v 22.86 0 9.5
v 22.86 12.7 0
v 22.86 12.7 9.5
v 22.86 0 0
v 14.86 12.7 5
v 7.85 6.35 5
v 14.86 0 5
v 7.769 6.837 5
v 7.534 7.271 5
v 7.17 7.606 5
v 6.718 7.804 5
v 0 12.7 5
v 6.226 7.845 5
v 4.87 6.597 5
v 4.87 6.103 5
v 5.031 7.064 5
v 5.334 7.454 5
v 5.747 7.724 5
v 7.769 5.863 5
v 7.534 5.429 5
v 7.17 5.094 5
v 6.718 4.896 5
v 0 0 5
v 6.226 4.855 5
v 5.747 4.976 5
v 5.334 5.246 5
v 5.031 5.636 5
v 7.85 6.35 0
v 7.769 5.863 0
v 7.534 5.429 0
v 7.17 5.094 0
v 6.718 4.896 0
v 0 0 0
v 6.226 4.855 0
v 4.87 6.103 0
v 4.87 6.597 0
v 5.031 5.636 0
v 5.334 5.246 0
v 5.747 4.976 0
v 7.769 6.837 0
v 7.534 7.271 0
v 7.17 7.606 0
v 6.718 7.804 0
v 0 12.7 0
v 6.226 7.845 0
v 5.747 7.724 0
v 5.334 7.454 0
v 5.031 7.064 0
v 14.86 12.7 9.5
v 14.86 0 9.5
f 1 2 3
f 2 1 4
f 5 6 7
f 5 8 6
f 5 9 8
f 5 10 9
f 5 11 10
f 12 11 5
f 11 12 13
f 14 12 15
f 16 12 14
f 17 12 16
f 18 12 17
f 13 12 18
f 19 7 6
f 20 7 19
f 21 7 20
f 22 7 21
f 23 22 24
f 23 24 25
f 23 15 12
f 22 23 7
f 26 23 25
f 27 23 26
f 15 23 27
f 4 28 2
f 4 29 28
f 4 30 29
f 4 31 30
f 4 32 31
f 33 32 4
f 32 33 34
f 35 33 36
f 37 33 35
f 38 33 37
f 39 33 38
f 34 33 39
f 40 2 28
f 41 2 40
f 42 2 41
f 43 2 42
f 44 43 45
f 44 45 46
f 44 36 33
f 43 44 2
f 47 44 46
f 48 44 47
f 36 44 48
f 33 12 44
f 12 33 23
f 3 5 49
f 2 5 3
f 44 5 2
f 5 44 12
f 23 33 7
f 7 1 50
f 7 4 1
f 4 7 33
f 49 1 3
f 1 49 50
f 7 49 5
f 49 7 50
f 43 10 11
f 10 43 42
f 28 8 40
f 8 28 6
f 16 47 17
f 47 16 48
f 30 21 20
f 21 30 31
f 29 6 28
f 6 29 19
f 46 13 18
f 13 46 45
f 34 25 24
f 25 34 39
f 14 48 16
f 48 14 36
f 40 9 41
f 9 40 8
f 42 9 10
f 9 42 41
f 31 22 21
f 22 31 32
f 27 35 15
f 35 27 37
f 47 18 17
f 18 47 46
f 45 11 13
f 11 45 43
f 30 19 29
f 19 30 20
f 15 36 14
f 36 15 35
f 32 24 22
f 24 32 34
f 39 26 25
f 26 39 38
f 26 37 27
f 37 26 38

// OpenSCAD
$fa = 1;
$fs = 0.5;

// 8mm deep inset, ~3.4mm glass, 4.5mm deep 
depth = 4.5; 
// 3mm diameter wood screws
screw = 3; 

module clip(depth, screw) {
    difference() {
        union() {
            cube([22.86, 12.7, 5]);
            translate([14.86, 0, 0])
              cube([8, 12.7, 5 + depth]);
        }
        
        translate([6.35, 6.35, 2.5])
          cylinder(r=screw/2, h=6, center=true);
    }
}


clip(depth=depth, screw=screw);
